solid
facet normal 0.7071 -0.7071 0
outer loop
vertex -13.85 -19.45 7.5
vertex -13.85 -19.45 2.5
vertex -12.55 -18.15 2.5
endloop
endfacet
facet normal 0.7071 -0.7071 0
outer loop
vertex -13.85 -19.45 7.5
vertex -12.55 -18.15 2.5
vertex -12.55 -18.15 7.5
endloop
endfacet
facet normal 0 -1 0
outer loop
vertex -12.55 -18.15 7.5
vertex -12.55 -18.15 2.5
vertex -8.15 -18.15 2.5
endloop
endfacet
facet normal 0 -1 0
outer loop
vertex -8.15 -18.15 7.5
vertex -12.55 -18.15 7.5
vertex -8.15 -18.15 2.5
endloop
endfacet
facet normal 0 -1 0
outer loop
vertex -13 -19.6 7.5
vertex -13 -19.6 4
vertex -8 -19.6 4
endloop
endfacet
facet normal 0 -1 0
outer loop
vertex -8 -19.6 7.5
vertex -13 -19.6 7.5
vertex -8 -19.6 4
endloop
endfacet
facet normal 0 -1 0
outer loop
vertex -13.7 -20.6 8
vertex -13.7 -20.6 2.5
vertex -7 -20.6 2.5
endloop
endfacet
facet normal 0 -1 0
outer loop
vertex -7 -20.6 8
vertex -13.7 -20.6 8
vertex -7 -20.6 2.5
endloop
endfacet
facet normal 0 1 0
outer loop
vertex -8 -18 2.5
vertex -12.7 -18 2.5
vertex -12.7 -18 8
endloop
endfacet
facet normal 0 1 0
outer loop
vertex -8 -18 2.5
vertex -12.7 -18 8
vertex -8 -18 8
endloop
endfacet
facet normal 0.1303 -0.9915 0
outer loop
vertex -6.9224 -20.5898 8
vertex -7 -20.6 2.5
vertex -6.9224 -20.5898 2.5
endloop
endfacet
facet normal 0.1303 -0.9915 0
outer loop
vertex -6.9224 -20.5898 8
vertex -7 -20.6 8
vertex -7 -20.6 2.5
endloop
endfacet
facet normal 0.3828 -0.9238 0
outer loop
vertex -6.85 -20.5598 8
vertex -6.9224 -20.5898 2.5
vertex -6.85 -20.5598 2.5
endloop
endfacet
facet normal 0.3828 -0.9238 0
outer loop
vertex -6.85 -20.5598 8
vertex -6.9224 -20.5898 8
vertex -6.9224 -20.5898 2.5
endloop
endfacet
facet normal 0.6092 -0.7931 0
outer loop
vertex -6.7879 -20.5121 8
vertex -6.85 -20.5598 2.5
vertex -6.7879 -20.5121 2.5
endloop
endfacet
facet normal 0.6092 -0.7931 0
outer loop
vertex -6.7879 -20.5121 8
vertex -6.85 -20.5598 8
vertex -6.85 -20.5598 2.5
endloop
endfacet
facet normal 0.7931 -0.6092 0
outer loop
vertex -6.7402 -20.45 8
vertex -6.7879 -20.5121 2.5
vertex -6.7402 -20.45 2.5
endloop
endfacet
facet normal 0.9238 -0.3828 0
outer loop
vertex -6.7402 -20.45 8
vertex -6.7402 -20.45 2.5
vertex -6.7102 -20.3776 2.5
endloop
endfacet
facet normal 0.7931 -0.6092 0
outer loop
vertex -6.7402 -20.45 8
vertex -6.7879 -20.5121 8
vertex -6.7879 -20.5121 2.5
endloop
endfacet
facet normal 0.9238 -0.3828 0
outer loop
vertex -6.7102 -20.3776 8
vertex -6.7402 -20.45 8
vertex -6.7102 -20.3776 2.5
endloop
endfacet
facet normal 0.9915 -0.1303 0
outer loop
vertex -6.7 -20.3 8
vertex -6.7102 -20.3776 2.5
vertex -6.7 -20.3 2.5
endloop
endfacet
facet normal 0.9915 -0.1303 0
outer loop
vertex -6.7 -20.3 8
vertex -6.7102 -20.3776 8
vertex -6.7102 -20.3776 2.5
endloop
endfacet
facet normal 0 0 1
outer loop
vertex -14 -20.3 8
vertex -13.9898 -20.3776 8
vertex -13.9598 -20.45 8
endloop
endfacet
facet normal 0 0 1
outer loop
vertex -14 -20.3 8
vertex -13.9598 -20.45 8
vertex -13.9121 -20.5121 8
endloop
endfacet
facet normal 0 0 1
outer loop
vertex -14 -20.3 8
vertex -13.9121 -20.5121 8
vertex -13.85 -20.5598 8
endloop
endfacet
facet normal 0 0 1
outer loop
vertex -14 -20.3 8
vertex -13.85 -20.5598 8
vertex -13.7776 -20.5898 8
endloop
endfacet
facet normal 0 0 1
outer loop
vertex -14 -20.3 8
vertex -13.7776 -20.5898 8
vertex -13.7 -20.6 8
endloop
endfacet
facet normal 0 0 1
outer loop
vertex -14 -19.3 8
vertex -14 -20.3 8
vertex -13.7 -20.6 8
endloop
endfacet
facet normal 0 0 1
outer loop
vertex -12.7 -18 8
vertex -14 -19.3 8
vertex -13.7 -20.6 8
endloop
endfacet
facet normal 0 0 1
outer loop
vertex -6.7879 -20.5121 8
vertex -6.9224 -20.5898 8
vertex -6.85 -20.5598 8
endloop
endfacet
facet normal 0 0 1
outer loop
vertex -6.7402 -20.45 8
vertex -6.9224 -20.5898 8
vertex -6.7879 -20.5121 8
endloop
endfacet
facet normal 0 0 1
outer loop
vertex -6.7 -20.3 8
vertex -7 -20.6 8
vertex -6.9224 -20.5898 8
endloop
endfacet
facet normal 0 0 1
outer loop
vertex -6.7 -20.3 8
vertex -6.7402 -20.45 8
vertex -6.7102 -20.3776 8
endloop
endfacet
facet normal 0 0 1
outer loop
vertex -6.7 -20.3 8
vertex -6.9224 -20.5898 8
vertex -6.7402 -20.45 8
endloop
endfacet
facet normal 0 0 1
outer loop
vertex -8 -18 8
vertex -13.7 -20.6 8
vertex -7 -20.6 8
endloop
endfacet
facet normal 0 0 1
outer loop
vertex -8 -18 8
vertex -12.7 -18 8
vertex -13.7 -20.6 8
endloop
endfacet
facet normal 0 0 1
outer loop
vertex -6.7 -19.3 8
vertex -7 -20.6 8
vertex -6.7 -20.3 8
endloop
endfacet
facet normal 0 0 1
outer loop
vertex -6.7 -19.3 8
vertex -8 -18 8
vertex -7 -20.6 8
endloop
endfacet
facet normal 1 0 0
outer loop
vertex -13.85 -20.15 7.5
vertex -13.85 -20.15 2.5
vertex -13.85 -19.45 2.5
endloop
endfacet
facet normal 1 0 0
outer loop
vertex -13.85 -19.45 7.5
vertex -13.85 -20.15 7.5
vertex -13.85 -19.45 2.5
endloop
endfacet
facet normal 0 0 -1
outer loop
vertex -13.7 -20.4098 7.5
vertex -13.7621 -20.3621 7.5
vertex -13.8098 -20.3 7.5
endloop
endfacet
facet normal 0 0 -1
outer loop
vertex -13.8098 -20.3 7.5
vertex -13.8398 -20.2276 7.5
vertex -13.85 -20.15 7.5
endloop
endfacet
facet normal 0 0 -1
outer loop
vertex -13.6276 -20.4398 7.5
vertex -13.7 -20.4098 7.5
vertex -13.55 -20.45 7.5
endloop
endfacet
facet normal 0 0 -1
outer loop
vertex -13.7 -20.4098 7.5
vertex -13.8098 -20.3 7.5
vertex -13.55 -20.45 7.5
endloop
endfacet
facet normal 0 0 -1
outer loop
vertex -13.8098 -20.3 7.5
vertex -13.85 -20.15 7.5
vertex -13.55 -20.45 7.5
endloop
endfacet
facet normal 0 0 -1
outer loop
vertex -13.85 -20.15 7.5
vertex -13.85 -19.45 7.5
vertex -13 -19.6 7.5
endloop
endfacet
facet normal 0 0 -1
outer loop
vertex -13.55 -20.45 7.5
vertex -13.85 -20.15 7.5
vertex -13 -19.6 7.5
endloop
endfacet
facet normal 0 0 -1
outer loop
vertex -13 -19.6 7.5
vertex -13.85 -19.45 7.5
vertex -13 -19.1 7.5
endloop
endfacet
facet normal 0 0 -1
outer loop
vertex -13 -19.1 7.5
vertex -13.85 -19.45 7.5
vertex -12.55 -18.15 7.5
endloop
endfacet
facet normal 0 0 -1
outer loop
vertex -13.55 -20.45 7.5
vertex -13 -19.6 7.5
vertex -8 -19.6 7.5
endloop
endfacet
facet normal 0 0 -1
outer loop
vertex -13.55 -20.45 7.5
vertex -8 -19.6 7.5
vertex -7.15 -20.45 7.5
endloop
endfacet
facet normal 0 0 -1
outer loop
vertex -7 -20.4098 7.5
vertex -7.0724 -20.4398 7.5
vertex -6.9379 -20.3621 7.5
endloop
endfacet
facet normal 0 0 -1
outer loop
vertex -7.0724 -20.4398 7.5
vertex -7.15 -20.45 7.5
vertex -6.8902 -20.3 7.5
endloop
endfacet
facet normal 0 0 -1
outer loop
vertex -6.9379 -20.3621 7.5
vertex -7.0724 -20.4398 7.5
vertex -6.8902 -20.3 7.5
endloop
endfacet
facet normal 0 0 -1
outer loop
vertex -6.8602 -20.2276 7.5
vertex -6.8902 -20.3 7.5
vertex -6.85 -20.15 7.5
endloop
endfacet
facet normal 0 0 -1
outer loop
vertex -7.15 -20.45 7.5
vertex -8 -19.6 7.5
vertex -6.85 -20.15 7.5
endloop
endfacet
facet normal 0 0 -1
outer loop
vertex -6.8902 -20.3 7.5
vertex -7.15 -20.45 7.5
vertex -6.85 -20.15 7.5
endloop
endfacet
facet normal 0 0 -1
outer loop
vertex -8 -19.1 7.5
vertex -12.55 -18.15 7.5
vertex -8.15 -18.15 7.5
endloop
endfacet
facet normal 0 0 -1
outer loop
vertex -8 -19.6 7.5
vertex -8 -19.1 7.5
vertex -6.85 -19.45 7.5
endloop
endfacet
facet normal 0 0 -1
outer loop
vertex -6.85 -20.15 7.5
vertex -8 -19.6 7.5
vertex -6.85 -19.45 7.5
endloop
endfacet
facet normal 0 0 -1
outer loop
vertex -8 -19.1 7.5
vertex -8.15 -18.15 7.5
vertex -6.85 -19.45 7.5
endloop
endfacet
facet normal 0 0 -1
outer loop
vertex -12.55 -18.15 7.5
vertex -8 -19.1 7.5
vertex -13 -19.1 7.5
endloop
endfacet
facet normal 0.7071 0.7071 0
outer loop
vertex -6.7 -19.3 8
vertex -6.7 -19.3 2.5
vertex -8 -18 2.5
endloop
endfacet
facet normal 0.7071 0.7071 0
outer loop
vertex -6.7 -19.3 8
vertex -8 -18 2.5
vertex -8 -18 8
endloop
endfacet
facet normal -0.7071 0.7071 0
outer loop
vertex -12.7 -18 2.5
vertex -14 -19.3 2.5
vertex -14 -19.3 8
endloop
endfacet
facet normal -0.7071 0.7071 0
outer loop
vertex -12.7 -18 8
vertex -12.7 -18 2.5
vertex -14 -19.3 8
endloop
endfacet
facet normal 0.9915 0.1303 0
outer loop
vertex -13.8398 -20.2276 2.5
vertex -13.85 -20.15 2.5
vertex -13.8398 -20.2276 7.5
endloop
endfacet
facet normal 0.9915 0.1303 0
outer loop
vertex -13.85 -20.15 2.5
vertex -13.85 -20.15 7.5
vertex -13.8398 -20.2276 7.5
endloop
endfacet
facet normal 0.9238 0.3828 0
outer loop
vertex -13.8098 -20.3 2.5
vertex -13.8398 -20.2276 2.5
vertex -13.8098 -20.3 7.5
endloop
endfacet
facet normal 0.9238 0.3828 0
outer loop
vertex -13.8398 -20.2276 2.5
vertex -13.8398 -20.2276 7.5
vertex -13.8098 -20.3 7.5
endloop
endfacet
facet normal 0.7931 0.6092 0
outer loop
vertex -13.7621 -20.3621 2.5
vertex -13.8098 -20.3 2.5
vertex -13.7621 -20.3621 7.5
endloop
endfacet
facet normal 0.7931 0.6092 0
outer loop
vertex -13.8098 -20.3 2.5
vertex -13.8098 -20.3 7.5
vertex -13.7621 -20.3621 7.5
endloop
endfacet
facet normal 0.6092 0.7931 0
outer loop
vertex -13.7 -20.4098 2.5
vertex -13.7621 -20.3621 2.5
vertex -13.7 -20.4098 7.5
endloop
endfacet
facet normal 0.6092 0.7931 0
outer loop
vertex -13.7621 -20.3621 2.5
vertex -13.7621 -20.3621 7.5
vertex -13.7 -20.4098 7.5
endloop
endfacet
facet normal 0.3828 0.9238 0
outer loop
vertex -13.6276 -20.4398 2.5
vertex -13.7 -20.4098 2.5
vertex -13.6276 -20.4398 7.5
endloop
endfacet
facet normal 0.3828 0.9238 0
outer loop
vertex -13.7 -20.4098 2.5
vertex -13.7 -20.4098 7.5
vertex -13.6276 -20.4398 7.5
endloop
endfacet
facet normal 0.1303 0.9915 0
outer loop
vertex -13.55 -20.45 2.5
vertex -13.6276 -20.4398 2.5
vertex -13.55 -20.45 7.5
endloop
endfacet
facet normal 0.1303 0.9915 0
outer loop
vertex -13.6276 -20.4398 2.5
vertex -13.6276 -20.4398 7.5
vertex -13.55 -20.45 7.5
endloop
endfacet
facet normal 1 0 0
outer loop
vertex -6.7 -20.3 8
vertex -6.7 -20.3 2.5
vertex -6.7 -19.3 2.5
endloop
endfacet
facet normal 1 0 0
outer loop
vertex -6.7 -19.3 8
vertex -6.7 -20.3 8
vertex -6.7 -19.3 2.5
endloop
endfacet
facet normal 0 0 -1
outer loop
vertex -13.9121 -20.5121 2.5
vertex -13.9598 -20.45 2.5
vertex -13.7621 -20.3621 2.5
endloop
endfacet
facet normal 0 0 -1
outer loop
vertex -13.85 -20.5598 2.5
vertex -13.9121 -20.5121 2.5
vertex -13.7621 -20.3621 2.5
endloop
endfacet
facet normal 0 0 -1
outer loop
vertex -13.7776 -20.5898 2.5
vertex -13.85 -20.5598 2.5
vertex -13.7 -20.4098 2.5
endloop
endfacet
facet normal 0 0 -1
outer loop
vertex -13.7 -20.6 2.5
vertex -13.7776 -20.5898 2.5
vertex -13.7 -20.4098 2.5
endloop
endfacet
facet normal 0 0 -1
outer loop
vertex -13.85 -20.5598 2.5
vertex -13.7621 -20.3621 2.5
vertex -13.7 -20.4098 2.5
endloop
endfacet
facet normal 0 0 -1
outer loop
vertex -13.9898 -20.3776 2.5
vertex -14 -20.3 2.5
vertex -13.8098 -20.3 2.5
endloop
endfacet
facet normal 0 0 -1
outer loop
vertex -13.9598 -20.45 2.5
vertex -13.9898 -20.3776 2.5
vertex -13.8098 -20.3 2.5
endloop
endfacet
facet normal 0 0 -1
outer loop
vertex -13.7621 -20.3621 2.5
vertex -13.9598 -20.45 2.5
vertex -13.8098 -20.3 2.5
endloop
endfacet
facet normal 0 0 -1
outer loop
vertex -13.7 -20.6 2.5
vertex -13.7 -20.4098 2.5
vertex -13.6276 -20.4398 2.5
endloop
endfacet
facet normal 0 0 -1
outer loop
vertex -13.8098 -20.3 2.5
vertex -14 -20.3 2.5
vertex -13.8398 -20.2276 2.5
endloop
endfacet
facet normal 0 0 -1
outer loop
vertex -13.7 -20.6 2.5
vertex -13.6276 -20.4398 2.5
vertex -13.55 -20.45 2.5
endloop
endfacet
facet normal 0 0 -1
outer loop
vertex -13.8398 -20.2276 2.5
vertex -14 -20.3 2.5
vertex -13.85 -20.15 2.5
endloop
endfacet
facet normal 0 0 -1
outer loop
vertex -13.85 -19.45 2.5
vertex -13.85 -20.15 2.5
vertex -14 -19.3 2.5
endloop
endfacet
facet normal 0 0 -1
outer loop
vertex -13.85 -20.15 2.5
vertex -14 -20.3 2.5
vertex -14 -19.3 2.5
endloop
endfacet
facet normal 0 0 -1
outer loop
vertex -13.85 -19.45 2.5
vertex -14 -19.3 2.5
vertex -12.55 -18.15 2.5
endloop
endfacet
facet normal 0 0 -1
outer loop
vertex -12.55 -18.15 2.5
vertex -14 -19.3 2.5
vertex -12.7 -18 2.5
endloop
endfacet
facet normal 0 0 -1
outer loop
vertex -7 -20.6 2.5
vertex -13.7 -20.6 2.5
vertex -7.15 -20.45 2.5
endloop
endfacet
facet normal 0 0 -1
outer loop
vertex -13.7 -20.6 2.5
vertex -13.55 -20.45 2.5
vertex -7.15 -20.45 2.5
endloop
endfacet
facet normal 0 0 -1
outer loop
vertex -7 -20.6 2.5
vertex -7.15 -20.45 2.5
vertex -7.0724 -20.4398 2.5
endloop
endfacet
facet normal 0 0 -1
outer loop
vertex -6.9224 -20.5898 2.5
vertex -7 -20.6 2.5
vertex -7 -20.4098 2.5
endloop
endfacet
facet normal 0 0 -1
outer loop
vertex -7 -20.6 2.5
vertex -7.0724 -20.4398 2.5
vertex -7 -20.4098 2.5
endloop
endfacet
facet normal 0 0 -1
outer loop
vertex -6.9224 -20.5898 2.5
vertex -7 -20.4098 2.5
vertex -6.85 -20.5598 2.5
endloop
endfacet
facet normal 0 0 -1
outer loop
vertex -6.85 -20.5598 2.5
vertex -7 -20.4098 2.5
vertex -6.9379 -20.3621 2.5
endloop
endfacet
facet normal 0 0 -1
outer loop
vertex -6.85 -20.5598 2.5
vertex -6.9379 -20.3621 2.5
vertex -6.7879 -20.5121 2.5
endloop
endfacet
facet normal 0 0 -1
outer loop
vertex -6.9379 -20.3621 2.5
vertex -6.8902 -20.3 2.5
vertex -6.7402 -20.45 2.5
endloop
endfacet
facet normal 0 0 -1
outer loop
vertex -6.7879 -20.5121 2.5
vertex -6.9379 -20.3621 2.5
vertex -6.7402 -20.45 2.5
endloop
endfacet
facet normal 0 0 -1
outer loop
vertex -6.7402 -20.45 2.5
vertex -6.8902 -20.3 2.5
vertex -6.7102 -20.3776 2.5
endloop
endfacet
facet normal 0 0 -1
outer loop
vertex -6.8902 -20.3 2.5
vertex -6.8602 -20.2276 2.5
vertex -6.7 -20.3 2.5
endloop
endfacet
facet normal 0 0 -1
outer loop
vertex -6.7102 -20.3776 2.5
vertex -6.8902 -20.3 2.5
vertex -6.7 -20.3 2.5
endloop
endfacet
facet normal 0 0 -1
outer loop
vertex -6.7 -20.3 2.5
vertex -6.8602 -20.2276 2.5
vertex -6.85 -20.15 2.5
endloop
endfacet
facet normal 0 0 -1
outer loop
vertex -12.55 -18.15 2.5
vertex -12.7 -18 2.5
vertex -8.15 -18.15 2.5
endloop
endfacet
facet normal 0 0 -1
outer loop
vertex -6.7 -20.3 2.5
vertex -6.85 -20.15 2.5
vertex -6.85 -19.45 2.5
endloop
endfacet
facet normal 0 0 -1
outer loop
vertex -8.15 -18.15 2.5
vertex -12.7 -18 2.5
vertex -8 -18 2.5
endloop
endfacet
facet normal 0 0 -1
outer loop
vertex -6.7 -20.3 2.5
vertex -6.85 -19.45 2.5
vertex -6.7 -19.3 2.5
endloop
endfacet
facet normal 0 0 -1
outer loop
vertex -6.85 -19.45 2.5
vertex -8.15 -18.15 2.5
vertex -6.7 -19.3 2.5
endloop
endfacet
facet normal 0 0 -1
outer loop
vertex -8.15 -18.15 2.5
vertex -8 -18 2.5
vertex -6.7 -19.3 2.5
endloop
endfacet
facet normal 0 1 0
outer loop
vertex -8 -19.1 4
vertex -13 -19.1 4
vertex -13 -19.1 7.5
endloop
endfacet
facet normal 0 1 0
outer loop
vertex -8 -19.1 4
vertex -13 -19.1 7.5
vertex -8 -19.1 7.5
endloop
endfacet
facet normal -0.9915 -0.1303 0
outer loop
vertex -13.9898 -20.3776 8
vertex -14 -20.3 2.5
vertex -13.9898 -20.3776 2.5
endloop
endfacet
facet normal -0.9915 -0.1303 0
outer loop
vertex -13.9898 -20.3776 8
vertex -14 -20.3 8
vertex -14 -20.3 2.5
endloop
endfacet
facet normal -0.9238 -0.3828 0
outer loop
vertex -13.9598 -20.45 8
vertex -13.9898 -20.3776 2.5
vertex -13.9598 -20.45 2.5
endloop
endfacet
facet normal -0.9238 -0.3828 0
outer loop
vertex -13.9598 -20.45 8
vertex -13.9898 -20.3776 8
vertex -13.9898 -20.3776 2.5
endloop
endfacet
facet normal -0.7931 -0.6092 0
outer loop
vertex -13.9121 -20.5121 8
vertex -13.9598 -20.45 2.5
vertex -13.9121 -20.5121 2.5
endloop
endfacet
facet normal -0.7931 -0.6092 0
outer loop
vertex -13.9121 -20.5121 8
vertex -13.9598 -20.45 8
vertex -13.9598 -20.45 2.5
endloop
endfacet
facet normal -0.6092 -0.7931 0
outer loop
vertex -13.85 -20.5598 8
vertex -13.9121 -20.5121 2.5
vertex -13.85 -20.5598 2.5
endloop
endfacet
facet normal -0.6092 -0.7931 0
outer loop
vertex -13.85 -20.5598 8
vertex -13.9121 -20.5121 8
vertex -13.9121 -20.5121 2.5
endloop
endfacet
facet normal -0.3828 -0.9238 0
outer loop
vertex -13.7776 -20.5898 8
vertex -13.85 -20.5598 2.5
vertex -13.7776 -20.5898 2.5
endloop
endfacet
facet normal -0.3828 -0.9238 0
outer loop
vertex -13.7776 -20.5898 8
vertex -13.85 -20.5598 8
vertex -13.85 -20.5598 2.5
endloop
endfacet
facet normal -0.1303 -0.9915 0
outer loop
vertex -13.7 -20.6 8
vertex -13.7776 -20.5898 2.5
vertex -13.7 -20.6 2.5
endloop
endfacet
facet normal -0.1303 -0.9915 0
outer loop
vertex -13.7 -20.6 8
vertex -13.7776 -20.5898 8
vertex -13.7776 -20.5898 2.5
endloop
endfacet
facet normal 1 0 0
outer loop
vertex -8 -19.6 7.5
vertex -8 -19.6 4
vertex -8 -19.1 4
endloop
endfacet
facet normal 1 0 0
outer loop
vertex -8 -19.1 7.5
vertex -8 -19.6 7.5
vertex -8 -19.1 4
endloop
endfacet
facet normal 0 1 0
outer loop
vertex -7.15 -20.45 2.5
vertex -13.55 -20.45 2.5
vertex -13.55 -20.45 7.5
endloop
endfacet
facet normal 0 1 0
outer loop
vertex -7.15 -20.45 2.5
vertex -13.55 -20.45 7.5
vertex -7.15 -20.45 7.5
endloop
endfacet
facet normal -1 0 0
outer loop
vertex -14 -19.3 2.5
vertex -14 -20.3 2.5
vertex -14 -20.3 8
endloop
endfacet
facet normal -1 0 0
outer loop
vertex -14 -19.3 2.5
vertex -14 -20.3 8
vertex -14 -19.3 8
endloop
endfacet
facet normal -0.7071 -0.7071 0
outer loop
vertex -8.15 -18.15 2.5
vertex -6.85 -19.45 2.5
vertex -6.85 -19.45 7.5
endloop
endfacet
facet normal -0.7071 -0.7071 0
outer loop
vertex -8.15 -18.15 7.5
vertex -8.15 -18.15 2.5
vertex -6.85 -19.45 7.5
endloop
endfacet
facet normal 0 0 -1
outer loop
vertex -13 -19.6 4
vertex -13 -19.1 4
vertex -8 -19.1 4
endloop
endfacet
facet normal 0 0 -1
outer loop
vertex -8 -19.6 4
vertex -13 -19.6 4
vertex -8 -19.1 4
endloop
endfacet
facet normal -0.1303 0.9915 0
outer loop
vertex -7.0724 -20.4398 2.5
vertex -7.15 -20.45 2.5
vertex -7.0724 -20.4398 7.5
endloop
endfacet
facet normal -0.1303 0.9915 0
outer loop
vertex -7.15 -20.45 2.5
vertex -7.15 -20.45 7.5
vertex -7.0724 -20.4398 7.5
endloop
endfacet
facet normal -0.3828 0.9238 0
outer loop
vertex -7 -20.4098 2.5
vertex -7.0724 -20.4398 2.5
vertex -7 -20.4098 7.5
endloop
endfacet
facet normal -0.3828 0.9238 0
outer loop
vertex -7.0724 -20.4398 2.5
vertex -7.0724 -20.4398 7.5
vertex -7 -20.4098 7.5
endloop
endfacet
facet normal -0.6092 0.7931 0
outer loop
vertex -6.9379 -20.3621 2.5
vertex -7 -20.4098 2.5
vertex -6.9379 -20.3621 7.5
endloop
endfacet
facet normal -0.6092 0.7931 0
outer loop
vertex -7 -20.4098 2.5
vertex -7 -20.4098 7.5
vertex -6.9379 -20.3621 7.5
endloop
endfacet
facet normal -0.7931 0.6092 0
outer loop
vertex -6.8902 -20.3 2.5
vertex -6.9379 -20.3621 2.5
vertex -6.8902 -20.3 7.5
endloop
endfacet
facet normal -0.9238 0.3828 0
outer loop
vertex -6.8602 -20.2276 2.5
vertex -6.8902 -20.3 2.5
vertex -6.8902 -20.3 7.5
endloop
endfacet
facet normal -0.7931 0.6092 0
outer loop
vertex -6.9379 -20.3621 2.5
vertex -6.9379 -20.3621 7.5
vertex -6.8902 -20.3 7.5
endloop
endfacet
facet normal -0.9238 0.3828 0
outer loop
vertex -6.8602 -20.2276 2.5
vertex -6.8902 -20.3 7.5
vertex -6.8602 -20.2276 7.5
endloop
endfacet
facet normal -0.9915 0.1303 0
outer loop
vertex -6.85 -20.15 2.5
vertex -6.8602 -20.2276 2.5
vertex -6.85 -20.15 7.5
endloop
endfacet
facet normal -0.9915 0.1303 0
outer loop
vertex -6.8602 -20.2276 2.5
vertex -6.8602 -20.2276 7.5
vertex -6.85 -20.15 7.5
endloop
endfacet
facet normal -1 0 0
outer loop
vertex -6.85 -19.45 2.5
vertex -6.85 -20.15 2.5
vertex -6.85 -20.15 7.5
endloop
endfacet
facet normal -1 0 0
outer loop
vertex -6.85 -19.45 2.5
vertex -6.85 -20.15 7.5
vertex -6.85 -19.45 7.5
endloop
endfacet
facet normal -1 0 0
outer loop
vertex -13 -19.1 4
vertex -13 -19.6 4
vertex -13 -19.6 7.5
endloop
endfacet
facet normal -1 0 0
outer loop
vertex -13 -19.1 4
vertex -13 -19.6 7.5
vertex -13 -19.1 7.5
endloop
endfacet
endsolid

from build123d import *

# Parameters (mm, degrees)
BOX301_W        = 7
BOX301_H        = 2.3
BOX301_DEPTH    = 5
FILLET223_R     = 0.3
CHAMFER043_SIZE = 1.3
CHAMFER044_SIZE = 1.3
BOX300_W        = 7.3
BOX300_H        = 2.6
BOX300_DEPTH    = 5.5
FILLET222_R     = 0.3
CHAMFER041_SIZE = 1.3
CHAMFER042_SIZE = 1.3
BOX302_W        = 5
BOX302_H        = 0.5
BOX302_DEPTH    = 4


with BuildPart() as chamfer044:
    # Box301 → Box301 (new body)
    with BuildSketch(Plane.XY):
        with Locations((3.5, 1.15)):
            Rectangle(BOX301_W, BOX301_H)
    extrude(amount=BOX301_DEPTH)

    # Fillet223
    fillet223_edges = [chamfer044.edges().sort_by_distance(p)[0] for p in [
        (0, 0, 2.5),
        (7, 0, 2.5),
    ]]
    fillet(fillet223_edges, radius=FILLET223_R)

    # Chamfer043
    chamfer043_edges = [chamfer044.edges().sort_by_distance(p)[0] for p in [
        (7, 2.3, 2.5),
    ]]
    chamfer(chamfer043_edges, length=CHAMFER043_SIZE)

    # Chamfer044
    chamfer044_edges = [chamfer044.edges().sort_by_distance(p)[0] for p in [
        (0, 2.3, 2.5),
    ]]
    chamfer(chamfer044_edges, length=CHAMFER044_SIZE)


with BuildPart() as chamfer044_1:
    # Chamfer044 placement: moved
    add(chamfer044.part.moved(Location((0.15, 0.15, 0))))


with BuildPart() as cut347:
    # Box300 → Box300 (new body)
    with BuildSketch(Plane.XY):
        with Locations((3.65, 1.3)):
            Rectangle(BOX300_W, BOX300_H)
    extrude(amount=BOX300_DEPTH)

    # Fillet222
    fillet222_edges = [cut347.edges().sort_by_distance(p)[0] for p in [
        (0, 0, 2.75),
        (7.3, 0, 2.75),
    ]]
    fillet(fillet222_edges, radius=FILLET222_R)

    # Chamfer041
    chamfer041_edges = [cut347.edges().sort_by_distance(p)[0] for p in [
        (7.3, 2.6, 2.75),
    ]]
    chamfer(chamfer041_edges, length=CHAMFER041_SIZE)

    # Chamfer042
    chamfer042_edges = [cut347.edges().sort_by_distance(p)[0] for p in [
        (0, 2.6, 2.75),
    ]]
    chamfer(chamfer042_edges, length=CHAMFER042_SIZE)

    # Cut347: cut Chamfer044
    add(chamfer044_1.part, mode=Mode.SUBTRACT)


with BuildPart() as conector_microusb:
    # Box302 → Box302 (new body)
    with BuildSketch(Plane(origin=(1, 1, 1.5), x_dir=(1, 0, 0), z_dir=(0, 0, 1))):
        with Locations((2.5, 0.25)):
            Rectangle(BOX302_W, BOX302_H)
    extrude(amount=BOX302_DEPTH)

    # Fusion204: union Cut347
    add(cut347.part)


with BuildPart() as conector_microusb_1:
    # Fusion204 placement: moved
    add(conector_microusb.part.moved(Location((-14, -20.6, 2.5))))


solid = conector_microusb_1.part
